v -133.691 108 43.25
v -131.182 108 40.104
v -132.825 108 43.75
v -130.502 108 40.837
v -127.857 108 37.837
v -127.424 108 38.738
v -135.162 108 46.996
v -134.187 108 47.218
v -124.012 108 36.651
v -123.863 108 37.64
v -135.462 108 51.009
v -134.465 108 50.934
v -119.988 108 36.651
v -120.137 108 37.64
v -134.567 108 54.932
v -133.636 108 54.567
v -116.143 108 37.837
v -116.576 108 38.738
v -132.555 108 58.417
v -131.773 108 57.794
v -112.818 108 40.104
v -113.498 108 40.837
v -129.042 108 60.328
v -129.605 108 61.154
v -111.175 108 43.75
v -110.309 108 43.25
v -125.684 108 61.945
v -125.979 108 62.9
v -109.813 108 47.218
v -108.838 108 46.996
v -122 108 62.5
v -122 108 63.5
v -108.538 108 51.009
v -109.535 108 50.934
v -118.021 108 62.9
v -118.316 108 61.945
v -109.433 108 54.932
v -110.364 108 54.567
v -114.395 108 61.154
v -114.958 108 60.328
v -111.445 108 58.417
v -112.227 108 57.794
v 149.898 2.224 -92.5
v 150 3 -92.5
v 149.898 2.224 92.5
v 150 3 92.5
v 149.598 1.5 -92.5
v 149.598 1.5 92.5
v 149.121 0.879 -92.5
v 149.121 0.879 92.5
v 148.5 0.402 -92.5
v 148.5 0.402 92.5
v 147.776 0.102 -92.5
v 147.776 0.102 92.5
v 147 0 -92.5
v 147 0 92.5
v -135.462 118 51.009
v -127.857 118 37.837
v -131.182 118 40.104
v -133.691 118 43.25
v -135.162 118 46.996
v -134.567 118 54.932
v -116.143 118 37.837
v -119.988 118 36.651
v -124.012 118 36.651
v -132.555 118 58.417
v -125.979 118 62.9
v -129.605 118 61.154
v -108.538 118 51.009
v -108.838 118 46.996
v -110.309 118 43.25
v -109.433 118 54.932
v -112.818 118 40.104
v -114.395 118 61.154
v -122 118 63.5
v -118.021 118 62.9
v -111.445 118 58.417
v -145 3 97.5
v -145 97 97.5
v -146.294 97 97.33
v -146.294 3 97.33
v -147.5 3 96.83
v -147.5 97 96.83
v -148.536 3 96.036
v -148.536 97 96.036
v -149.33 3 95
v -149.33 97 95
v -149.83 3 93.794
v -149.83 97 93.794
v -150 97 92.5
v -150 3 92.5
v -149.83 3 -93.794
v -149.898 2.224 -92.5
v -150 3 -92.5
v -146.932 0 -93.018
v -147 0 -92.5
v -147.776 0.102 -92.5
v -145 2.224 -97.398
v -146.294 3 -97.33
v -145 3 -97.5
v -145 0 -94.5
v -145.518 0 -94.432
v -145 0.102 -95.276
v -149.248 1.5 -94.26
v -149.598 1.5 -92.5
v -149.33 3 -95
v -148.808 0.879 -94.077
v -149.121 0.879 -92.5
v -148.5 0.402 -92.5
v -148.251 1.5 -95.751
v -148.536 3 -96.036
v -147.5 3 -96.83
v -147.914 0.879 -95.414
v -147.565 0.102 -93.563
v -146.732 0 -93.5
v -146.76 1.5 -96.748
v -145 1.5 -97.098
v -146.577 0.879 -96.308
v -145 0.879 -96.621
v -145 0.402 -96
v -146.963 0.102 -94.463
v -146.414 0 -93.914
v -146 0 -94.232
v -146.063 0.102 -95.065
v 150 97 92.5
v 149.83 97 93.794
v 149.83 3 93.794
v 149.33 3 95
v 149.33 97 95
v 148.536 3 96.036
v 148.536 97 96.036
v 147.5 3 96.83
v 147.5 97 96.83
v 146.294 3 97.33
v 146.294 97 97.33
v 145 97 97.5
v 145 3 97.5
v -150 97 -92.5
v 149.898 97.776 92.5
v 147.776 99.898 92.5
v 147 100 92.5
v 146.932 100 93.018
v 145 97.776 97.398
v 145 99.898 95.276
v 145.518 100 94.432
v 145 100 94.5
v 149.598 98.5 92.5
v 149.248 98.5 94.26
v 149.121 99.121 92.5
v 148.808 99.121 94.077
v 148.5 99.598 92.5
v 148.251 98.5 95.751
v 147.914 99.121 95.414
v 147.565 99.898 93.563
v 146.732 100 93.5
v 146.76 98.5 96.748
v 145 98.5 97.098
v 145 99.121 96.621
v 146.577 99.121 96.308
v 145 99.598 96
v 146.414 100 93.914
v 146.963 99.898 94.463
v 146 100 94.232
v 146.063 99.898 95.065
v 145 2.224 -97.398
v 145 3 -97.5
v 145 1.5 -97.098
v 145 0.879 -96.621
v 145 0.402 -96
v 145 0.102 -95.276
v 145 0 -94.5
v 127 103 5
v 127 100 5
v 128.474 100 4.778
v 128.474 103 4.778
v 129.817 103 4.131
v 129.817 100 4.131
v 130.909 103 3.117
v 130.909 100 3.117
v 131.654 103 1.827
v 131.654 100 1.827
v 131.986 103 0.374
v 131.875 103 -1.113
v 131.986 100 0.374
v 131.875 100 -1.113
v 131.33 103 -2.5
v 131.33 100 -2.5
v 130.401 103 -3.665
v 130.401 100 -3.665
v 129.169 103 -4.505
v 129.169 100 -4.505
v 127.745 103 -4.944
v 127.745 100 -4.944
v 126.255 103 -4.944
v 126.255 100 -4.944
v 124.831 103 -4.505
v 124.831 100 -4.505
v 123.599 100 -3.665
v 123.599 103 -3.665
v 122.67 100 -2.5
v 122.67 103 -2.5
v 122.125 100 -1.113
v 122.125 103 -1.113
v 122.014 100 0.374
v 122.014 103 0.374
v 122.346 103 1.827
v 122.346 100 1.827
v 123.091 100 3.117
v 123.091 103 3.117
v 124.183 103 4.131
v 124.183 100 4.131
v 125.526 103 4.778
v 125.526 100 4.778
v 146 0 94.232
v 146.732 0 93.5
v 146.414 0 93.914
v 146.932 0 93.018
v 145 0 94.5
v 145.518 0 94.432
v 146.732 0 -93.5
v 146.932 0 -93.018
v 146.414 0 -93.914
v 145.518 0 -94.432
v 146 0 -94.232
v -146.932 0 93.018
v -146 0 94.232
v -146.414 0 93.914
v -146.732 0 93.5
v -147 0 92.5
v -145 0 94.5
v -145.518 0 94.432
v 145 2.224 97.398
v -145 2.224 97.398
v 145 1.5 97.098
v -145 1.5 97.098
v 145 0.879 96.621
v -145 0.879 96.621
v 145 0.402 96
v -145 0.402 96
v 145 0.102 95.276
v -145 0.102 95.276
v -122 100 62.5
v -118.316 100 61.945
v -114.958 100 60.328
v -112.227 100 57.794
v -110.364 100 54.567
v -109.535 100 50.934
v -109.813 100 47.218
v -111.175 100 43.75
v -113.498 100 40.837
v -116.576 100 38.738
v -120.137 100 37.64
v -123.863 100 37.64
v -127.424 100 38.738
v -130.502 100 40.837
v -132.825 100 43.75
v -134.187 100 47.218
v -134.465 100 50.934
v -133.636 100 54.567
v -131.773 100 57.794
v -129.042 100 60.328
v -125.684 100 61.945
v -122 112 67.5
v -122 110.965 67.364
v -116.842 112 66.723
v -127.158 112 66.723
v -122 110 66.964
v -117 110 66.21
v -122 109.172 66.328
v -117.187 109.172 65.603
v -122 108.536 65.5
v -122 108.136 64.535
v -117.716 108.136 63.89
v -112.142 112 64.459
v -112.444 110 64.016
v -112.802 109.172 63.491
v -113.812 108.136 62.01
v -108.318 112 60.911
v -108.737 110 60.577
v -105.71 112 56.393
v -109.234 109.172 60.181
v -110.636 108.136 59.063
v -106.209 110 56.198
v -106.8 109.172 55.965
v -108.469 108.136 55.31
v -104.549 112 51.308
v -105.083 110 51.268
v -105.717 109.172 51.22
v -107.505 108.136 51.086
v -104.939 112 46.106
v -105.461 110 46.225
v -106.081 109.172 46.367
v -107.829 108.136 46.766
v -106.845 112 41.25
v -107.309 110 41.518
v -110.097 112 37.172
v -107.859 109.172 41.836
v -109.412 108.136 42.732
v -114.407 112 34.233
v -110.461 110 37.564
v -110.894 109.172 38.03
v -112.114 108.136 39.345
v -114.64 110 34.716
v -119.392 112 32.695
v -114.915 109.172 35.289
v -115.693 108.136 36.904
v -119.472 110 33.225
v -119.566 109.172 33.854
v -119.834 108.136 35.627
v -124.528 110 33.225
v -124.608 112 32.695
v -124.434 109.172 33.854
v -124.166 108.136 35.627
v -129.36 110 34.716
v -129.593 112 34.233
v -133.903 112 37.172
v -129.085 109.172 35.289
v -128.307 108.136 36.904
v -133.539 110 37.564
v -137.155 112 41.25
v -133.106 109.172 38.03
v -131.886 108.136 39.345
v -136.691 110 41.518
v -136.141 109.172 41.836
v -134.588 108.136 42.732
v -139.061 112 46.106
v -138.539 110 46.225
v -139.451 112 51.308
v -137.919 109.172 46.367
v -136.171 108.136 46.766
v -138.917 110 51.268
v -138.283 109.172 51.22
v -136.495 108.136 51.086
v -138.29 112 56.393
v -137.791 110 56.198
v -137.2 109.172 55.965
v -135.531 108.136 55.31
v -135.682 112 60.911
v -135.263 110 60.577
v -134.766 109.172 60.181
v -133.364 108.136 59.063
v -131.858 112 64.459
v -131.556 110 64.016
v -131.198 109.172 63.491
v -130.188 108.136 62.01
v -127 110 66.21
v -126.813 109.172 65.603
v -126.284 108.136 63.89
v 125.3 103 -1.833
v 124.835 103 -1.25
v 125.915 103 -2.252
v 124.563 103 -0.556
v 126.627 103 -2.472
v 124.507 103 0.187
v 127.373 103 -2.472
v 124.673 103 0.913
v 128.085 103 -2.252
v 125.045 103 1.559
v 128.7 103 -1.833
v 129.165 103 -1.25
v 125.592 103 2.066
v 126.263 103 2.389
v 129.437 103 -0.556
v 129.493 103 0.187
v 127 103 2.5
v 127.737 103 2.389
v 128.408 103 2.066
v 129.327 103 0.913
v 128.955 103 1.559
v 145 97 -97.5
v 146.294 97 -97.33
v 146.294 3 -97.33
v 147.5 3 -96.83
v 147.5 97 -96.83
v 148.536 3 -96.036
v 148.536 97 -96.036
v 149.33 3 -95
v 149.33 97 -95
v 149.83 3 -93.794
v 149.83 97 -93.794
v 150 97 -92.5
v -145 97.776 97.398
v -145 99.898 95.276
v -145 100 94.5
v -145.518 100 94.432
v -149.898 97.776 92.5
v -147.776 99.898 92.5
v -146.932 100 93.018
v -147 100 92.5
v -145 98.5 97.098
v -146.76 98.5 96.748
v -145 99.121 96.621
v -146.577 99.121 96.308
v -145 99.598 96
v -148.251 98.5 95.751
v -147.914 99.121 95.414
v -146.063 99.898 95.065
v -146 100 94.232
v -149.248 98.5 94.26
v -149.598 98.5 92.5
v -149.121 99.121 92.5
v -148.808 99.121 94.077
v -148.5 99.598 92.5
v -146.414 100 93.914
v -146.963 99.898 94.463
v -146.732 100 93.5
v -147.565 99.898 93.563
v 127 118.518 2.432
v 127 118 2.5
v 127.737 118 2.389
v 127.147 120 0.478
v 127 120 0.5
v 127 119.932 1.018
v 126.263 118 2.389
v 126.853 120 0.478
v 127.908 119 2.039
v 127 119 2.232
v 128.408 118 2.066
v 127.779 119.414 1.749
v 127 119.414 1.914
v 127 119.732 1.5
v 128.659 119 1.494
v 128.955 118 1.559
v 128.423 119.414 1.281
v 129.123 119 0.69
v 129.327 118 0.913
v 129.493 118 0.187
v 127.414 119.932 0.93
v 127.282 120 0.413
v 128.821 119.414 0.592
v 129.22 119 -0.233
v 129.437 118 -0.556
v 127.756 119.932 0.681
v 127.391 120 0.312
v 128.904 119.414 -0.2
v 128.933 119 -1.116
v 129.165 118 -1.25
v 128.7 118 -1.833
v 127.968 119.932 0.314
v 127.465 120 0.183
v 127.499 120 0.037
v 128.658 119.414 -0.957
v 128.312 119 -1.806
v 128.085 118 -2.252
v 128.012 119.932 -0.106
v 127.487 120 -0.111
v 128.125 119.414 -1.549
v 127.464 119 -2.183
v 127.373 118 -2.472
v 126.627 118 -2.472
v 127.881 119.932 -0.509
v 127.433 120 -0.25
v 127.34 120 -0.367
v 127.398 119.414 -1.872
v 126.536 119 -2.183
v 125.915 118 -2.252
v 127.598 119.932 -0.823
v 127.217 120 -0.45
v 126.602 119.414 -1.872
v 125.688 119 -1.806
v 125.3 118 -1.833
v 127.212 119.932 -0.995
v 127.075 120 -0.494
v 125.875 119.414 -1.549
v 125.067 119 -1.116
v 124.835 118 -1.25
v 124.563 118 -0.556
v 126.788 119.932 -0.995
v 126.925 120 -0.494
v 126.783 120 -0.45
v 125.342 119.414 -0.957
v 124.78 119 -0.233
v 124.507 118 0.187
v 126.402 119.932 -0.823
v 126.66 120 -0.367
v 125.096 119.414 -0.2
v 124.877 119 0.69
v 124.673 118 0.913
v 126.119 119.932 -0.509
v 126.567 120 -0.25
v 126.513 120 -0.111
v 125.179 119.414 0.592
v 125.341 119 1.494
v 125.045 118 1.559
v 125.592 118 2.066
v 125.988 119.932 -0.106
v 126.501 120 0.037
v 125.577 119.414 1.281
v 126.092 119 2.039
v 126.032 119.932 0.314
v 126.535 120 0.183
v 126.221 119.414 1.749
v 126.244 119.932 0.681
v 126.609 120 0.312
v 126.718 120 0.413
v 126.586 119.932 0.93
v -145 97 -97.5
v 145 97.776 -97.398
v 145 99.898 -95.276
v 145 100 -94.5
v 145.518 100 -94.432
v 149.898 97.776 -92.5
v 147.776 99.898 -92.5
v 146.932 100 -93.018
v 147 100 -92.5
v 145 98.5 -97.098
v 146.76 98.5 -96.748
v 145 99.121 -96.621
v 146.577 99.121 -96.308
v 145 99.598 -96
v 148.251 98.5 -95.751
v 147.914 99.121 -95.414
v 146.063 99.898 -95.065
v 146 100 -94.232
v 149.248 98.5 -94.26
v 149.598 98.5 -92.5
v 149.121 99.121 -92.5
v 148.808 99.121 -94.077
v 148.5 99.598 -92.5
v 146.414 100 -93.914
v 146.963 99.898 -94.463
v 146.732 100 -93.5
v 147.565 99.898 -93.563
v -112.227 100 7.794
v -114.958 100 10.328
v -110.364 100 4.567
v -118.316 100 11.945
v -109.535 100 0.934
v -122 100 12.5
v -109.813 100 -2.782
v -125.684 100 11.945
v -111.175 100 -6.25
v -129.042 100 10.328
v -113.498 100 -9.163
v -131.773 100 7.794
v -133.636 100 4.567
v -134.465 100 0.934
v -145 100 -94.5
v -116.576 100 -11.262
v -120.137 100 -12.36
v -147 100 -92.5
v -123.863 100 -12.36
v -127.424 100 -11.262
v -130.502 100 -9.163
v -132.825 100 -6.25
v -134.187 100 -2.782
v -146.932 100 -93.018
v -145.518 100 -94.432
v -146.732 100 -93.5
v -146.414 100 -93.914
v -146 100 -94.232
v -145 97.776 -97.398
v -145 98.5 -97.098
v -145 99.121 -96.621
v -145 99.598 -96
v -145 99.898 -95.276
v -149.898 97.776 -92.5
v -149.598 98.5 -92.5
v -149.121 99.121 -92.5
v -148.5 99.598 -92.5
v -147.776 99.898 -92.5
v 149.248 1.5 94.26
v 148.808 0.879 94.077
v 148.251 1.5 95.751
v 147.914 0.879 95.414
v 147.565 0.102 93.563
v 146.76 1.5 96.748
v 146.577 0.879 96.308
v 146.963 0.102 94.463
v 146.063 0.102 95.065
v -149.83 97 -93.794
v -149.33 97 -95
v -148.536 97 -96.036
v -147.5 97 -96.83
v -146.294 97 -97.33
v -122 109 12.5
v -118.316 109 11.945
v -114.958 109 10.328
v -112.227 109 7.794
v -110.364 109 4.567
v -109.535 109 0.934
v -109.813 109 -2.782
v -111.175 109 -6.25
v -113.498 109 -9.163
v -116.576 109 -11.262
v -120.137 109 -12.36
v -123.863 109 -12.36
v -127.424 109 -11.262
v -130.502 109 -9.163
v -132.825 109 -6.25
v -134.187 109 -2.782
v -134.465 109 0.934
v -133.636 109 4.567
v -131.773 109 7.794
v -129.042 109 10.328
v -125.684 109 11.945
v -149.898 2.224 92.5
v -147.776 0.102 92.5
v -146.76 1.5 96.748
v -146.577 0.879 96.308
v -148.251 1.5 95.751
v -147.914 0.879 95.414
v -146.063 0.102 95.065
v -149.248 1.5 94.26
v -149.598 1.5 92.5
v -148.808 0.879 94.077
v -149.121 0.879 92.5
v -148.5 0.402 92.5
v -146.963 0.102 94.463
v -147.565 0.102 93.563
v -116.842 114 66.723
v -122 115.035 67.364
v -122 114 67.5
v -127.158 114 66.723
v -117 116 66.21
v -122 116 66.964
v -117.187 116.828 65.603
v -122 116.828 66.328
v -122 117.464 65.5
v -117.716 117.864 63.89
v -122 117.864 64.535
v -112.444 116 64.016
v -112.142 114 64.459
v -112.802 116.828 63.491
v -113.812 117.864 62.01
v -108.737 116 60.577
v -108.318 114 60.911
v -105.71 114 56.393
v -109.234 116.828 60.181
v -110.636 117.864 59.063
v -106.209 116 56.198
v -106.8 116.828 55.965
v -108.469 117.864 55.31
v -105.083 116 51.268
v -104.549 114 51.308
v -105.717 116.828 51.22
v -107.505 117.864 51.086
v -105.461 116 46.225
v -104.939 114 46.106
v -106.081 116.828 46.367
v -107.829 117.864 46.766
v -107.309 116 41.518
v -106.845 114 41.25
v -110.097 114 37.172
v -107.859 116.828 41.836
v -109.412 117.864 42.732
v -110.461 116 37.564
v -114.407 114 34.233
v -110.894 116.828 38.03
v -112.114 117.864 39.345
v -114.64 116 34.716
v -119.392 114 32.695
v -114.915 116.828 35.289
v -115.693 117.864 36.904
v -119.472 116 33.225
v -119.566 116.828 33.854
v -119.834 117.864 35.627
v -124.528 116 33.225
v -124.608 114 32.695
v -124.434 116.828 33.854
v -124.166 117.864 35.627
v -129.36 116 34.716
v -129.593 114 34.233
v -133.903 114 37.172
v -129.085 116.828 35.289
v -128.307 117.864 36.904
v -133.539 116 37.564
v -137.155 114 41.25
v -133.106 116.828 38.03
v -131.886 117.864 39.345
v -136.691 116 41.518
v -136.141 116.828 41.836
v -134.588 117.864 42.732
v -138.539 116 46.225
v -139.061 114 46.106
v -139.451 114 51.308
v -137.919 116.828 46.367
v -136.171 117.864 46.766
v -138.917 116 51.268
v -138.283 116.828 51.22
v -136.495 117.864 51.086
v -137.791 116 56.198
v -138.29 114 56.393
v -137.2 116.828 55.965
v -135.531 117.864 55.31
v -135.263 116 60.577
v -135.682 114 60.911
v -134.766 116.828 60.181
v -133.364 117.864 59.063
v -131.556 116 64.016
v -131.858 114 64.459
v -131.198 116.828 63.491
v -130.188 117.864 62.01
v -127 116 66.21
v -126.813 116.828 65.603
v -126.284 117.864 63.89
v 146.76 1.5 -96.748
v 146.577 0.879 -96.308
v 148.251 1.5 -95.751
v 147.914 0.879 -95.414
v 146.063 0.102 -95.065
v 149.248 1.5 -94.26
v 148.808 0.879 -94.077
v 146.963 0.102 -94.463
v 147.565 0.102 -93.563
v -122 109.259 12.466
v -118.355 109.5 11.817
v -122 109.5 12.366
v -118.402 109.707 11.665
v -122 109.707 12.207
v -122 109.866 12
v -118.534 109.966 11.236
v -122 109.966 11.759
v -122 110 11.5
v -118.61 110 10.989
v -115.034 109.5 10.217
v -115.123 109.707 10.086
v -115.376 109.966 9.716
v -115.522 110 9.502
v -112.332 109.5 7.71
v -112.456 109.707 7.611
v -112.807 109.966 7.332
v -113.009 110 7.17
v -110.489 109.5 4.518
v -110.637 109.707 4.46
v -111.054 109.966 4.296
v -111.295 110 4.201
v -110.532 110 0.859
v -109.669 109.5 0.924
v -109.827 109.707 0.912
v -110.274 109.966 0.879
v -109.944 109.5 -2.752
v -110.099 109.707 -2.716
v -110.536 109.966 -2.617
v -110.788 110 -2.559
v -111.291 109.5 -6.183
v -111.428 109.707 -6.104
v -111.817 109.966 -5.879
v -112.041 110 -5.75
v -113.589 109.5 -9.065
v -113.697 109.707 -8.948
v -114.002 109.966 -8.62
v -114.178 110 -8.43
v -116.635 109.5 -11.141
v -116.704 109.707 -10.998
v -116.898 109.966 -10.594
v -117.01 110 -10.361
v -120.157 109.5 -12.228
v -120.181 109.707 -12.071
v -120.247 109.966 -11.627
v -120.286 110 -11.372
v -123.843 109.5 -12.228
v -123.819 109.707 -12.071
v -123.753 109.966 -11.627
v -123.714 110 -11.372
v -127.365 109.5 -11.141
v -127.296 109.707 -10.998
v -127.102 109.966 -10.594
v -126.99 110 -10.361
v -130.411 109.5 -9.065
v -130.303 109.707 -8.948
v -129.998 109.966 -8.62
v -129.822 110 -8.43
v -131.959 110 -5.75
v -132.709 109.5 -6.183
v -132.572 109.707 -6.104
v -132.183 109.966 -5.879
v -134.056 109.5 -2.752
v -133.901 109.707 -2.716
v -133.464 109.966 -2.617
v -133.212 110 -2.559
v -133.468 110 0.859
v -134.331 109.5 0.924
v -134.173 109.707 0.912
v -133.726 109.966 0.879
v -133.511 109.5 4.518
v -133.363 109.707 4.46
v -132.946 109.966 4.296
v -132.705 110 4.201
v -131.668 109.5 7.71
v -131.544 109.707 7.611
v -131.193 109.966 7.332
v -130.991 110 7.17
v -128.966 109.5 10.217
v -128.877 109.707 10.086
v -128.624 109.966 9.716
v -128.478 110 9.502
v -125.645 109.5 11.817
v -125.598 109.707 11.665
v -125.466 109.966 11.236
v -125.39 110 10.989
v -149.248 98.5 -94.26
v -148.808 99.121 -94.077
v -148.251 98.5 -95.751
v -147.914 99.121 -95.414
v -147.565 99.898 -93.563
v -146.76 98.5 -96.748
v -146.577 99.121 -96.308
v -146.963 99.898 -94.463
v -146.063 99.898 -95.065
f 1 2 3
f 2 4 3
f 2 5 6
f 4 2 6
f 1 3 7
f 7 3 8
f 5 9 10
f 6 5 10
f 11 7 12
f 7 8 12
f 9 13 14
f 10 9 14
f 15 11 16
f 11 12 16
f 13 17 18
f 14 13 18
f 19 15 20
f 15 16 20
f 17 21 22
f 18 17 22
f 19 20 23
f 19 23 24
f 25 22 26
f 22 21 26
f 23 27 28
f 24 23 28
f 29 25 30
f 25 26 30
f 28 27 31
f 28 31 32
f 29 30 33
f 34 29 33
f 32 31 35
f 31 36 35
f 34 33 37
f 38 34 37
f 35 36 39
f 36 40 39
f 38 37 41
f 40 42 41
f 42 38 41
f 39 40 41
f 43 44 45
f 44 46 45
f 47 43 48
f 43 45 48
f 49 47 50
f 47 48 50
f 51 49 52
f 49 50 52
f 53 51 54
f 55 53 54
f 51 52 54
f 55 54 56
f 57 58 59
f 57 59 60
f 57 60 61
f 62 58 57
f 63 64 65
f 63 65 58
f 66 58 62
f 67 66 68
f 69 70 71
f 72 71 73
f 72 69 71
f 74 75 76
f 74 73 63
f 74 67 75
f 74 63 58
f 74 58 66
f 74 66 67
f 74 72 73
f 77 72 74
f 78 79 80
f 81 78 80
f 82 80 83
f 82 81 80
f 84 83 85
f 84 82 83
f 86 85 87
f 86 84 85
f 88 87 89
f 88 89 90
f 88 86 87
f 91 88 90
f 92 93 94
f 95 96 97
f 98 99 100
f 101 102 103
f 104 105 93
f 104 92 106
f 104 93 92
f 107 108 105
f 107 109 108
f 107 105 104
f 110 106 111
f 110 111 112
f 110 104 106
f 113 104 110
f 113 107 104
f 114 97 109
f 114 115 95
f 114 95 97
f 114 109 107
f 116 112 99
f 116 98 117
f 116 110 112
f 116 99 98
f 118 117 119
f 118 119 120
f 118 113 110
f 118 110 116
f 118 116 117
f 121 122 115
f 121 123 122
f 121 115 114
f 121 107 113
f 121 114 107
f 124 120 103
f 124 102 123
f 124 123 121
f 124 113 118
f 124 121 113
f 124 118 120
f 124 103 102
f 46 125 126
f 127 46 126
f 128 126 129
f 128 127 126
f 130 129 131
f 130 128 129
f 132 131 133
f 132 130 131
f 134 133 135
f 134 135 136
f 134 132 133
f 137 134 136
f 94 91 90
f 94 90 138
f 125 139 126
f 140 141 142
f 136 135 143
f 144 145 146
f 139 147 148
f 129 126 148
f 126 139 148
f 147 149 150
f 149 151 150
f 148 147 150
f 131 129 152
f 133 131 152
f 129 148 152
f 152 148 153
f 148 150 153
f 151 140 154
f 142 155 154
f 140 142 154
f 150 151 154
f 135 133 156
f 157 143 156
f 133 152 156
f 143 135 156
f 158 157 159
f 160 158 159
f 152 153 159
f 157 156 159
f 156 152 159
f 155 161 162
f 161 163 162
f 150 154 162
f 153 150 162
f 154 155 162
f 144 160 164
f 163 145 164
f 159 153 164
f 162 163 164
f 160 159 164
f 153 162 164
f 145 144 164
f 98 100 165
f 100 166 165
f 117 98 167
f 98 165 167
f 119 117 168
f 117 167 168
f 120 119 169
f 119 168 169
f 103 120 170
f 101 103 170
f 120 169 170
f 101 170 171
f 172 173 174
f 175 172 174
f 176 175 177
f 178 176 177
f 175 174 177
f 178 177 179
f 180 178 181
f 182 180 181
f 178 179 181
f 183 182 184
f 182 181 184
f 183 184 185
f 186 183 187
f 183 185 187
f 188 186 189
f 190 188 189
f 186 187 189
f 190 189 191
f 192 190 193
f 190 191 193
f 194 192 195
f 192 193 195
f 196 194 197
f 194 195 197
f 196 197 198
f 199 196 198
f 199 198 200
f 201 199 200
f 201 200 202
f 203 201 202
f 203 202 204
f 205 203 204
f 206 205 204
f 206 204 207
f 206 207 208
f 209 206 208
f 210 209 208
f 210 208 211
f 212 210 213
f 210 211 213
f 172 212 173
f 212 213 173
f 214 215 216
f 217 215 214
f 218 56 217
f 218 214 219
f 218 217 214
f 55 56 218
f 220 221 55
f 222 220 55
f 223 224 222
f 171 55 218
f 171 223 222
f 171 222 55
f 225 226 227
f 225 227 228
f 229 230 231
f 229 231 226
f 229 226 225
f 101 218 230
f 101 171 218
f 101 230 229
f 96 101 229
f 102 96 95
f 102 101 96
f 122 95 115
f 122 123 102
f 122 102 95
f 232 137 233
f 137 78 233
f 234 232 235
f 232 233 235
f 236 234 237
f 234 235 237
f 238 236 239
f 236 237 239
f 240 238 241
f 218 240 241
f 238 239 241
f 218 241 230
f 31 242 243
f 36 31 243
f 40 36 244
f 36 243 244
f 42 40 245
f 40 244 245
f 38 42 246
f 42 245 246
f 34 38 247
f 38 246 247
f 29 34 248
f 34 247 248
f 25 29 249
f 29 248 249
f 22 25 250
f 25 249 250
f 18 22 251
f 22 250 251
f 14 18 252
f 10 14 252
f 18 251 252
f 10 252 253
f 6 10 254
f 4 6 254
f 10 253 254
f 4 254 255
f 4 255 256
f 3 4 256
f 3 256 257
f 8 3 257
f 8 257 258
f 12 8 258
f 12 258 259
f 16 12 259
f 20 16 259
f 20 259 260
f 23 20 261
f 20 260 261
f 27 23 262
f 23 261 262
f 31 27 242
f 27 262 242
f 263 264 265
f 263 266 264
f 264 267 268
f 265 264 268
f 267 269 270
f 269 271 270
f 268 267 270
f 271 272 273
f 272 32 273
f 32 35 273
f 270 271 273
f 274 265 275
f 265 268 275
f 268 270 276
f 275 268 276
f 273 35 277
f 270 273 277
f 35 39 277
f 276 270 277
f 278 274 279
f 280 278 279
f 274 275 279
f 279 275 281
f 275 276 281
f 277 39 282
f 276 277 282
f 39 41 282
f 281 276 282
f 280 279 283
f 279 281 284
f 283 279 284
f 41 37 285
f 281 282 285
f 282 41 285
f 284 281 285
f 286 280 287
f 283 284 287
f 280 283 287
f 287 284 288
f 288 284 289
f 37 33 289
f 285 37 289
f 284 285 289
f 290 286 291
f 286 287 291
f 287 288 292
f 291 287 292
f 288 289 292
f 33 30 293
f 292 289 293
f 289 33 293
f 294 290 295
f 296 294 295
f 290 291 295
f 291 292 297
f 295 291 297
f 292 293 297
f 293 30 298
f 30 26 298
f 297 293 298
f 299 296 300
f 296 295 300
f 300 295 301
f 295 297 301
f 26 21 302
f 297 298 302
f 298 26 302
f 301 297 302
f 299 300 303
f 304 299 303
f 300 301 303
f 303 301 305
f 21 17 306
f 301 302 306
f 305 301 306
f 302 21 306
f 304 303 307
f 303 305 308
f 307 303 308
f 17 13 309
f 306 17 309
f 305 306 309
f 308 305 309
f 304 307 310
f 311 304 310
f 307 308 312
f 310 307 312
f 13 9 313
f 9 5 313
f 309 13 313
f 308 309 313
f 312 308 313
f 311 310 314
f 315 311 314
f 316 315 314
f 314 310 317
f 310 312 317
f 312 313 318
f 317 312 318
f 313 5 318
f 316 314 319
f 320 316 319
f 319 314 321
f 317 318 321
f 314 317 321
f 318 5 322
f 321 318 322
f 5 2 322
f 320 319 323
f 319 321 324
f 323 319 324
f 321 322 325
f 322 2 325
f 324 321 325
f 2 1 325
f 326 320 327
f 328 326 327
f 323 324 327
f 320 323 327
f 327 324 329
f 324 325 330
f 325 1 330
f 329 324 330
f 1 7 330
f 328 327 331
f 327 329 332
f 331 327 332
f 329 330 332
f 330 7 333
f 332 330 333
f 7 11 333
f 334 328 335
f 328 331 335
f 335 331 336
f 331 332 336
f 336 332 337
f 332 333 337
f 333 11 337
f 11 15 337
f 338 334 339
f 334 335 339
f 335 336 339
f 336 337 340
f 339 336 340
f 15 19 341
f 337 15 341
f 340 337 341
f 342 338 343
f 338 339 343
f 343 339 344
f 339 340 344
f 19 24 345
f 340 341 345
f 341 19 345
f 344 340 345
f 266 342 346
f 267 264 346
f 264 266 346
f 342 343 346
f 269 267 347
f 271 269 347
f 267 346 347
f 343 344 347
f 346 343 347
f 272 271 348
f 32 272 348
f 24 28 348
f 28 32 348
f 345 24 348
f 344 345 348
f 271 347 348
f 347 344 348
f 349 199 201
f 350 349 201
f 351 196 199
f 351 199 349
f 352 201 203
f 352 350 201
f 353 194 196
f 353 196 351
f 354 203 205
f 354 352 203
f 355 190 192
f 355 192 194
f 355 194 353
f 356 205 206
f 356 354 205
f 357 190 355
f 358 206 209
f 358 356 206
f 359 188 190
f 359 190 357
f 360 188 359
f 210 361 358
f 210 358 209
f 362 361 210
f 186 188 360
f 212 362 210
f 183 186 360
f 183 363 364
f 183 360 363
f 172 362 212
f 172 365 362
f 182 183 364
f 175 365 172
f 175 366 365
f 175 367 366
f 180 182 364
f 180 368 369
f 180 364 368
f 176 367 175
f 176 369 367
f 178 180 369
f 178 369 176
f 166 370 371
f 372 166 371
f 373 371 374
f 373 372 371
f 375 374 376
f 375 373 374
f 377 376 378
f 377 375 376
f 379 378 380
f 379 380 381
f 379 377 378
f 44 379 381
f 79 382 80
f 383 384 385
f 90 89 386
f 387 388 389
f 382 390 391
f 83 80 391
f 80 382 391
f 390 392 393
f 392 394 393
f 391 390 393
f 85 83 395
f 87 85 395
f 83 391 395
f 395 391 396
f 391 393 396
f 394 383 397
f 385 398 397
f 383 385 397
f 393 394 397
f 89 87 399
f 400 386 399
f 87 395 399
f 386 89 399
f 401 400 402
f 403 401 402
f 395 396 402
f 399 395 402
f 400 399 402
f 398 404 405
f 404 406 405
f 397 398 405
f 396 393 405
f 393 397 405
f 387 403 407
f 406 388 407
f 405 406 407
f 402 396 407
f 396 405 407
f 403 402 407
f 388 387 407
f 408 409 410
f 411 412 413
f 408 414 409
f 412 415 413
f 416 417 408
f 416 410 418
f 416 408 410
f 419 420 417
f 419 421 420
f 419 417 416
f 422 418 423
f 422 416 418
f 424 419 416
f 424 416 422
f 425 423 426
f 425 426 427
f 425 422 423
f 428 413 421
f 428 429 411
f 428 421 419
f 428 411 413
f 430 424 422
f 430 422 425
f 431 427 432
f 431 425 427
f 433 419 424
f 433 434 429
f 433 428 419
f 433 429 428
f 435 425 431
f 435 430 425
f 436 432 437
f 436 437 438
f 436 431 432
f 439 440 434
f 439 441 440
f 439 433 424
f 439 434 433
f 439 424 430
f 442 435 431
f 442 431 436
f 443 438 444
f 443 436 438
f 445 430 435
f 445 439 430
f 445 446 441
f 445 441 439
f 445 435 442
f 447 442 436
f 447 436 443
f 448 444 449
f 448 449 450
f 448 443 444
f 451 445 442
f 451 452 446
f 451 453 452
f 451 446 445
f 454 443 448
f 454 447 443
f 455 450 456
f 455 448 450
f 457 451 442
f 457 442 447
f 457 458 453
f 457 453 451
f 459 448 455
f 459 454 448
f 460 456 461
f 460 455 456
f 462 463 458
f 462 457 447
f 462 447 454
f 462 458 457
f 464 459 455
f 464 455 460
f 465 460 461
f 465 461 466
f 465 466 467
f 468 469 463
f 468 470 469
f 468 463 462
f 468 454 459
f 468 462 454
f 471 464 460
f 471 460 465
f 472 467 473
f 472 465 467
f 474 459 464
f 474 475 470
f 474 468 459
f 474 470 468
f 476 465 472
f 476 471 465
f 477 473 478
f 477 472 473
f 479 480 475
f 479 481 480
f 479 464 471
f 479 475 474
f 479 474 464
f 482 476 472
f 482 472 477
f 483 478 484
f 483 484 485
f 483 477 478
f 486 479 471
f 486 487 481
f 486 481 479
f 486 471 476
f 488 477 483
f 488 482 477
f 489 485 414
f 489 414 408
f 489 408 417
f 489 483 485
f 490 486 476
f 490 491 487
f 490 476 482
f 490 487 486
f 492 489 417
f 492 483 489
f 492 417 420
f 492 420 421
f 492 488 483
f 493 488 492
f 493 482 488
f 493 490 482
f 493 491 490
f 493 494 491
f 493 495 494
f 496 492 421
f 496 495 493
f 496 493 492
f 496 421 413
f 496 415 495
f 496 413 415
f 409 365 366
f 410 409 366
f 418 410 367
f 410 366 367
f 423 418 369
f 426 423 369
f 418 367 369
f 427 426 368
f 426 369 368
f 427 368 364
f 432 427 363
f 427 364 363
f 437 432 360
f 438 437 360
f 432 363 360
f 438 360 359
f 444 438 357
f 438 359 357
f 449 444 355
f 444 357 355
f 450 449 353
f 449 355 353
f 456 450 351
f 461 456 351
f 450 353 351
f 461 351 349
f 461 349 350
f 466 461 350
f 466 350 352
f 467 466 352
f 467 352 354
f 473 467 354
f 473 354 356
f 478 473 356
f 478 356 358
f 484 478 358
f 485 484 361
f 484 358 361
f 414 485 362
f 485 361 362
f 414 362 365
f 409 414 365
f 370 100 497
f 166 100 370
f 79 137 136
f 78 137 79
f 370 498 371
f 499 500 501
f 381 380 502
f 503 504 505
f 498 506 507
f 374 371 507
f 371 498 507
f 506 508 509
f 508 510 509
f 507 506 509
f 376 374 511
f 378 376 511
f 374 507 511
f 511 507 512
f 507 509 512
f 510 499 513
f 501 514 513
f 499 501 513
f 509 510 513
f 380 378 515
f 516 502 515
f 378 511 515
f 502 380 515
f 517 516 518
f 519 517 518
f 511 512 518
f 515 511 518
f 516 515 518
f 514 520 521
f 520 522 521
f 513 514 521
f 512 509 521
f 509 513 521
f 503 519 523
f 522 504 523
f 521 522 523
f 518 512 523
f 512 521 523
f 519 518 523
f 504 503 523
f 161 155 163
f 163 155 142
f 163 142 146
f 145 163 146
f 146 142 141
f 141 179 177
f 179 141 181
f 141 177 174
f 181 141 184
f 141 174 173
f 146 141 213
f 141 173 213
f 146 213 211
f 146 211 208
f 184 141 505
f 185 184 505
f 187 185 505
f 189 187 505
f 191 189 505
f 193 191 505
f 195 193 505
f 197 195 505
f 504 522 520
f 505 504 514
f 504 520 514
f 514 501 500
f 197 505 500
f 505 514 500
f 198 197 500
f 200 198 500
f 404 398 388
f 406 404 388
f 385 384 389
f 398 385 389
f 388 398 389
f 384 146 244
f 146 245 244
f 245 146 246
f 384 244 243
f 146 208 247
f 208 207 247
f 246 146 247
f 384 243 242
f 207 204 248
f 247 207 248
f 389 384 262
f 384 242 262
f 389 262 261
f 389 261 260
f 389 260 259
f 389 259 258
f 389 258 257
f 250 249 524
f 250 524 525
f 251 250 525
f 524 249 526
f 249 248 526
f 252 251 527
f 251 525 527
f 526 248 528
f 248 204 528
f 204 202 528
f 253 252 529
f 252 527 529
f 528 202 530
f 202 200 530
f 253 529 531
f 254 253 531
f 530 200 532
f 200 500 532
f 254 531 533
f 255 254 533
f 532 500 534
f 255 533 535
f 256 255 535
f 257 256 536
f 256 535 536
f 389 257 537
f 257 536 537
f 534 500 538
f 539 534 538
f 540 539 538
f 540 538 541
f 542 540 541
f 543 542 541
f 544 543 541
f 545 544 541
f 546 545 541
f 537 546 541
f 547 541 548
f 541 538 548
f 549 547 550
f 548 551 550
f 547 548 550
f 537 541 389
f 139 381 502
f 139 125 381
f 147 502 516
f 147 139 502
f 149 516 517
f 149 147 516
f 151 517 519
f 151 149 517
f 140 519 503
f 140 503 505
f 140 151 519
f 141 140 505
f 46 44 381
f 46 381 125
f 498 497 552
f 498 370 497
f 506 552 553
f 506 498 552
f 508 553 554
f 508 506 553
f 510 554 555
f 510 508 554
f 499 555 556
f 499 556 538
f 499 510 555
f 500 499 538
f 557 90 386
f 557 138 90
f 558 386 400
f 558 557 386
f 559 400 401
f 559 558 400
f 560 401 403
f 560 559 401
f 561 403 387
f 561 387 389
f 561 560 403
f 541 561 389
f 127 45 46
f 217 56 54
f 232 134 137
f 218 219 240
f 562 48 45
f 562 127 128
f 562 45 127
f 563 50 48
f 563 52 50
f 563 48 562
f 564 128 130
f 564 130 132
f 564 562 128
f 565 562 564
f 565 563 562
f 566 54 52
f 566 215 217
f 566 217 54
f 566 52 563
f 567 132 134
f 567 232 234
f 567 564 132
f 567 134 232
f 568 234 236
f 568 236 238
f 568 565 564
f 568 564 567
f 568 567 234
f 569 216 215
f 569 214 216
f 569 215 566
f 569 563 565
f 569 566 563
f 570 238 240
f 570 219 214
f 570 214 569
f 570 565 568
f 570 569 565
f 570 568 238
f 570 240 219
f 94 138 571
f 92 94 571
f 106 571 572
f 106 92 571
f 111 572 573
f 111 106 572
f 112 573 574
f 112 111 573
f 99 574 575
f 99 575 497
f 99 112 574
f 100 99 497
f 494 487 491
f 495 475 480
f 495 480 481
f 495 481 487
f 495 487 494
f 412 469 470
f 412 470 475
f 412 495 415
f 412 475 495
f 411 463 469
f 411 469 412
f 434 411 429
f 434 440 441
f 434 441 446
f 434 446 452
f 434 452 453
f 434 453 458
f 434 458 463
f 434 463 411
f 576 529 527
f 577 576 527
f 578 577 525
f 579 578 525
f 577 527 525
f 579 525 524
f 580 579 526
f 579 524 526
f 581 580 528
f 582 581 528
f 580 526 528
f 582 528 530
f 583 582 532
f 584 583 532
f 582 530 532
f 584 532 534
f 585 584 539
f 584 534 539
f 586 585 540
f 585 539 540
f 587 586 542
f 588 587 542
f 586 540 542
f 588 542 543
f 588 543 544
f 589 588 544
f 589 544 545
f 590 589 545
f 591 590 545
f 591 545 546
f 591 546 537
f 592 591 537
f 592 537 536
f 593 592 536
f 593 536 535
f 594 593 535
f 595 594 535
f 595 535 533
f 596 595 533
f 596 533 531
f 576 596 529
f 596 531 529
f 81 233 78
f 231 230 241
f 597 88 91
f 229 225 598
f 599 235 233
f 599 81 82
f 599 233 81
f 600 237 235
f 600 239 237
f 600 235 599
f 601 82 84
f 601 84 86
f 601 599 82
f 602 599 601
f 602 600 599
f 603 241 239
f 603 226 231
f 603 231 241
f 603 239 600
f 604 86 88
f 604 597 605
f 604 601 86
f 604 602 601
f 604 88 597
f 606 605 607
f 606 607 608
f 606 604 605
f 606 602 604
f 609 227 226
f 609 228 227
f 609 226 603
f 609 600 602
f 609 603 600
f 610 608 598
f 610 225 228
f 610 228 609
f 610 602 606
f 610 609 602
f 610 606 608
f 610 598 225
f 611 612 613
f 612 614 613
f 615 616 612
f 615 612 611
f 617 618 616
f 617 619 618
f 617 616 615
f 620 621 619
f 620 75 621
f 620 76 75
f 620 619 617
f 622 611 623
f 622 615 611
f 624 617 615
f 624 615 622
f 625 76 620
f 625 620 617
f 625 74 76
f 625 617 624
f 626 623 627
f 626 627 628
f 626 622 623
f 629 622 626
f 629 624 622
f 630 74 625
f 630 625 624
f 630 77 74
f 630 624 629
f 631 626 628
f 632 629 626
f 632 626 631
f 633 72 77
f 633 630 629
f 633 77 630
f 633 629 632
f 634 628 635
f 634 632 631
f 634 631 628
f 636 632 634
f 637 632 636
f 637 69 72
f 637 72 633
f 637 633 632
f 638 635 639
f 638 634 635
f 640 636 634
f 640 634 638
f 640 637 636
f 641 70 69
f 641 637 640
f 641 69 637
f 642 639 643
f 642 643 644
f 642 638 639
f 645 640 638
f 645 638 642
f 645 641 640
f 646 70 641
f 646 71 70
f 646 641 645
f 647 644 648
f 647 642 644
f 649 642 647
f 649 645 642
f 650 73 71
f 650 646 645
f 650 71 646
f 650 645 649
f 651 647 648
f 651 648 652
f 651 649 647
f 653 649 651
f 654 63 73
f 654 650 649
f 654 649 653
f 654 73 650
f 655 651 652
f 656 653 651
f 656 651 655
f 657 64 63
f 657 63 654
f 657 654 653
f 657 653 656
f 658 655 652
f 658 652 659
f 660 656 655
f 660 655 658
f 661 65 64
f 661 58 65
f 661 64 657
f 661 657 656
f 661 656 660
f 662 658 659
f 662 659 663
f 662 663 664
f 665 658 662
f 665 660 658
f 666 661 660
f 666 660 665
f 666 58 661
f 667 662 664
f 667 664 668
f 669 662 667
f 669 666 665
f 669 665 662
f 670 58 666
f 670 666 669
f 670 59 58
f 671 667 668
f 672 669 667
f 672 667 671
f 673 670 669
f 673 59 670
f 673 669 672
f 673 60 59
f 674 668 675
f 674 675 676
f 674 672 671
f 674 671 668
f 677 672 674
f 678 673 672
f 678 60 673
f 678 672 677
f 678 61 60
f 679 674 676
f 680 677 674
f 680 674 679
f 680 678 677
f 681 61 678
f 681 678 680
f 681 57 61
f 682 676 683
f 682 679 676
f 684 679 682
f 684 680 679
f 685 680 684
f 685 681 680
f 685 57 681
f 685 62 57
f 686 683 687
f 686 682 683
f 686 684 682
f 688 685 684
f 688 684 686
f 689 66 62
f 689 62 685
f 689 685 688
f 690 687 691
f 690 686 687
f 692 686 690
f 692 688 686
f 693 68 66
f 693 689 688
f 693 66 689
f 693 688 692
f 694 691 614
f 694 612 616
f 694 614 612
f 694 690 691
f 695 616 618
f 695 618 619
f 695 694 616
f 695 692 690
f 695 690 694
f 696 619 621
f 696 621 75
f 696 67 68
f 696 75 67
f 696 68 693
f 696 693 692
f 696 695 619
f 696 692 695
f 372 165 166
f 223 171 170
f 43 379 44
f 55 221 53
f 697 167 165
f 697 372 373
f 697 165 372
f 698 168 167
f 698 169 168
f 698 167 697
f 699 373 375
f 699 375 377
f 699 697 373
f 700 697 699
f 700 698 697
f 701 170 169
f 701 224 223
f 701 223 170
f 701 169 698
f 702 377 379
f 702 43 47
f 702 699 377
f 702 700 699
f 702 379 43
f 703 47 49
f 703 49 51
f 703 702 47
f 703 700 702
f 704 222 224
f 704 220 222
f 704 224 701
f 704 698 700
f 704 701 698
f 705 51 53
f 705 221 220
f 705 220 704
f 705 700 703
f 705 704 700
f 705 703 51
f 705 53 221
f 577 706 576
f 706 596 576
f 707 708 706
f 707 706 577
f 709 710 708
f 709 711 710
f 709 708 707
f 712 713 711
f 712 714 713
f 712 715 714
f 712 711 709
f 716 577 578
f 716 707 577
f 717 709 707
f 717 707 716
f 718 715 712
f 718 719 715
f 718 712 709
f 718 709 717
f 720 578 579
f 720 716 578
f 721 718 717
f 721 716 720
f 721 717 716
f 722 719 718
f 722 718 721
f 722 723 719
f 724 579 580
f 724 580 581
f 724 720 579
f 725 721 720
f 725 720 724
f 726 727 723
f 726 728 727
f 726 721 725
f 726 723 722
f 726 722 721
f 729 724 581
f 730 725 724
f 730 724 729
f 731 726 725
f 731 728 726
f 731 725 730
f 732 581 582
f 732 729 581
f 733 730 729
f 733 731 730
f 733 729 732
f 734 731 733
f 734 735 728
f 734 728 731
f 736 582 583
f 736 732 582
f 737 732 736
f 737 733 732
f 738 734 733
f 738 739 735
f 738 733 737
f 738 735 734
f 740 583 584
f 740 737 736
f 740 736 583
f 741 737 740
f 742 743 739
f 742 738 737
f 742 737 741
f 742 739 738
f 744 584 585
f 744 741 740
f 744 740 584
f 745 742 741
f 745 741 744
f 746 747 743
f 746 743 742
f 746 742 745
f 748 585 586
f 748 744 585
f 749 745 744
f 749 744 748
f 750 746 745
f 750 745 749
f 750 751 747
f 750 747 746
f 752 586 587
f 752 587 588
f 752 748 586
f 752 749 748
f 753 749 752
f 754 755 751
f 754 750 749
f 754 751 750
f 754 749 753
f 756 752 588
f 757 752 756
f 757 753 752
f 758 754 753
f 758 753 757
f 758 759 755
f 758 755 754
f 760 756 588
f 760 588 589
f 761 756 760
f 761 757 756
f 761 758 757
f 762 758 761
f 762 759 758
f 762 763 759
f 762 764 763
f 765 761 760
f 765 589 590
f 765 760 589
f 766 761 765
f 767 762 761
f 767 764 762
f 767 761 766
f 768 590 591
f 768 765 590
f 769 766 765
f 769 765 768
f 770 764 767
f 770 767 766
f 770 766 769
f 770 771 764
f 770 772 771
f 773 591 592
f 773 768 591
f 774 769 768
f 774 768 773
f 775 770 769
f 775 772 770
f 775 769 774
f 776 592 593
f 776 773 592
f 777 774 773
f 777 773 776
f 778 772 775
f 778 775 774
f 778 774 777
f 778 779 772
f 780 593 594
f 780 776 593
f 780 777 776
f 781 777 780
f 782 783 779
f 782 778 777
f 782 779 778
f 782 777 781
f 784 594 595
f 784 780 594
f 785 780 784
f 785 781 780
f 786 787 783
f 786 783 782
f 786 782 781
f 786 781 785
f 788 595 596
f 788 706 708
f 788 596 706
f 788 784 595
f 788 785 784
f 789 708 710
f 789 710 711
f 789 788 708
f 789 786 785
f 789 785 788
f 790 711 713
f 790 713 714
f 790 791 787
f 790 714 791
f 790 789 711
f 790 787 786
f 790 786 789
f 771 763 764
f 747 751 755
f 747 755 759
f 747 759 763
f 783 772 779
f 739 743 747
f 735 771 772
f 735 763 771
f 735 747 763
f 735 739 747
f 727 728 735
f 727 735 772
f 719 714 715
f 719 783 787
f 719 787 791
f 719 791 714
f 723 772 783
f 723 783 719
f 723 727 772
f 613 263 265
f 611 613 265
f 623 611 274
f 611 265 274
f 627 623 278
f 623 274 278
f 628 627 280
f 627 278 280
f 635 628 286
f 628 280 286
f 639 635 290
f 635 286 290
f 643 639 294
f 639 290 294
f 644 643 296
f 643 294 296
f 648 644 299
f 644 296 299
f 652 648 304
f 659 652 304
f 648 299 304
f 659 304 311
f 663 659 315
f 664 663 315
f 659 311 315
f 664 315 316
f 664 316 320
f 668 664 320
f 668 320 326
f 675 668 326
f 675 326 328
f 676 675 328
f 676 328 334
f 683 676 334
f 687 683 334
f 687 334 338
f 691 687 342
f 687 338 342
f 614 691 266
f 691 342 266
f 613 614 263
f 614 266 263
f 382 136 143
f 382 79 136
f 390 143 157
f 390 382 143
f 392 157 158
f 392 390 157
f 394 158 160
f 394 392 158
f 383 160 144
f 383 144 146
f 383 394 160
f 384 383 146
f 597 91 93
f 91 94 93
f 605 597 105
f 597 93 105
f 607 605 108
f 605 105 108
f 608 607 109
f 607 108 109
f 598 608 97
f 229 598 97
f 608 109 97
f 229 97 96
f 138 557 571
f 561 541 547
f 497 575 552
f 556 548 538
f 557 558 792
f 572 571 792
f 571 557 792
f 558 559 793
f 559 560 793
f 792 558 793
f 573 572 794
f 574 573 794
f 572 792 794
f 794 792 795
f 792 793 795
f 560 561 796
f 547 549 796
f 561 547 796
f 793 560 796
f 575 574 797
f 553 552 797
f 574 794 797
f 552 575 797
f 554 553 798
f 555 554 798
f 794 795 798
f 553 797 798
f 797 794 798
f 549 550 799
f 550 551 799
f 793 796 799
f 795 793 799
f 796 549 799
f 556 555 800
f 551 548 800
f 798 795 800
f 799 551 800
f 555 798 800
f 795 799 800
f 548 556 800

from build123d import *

# Parameters (mm, degrees)
BOSS_EXTRUDE1_DEPTH = 100
FILLET3_R           = 3
SKETCH3_R           = 12.5
BOSS_EXTRUDE2_DEPTH = 10
SKETCH4_R           = 12.5
BOSS_EXTRUDE3_DEPTH = 8
SKETCH5_R           = 17.5
BOSS_EXTRUDE5_DEPTH = 10
FILLET6_R           = 4
FILLET7_R           = 1
SKETCH6_R           = 5
BOSS_EXTRUDE6_DEPTH = 3
SKETCH7_R           = 2.5
BOSS_EXTRUDE7_DEPTH = 17
FILLET13_R          = 2


with BuildPart() as part:
    # Sketch2 → Boss-Extrude1 (new body)
    with BuildSketch(Plane(origin=(0, 0, 0), x_dir=(1, 0, 0), z_dir=(0, 1, 0))):
        with BuildLine():
            Line((-145, 97.5), (145, 97.5))
            ThreePointArc((145, 97.5), (148.535533906, 96.035533906), (150, 92.5))
            Line((150, 92.5), (150, -92.5))
            ThreePointArc((150, -92.5), (148.535533906, -96.035533906), (145, -97.5))
            Line((145, -97.5), (-145, -97.5))
            ThreePointArc((-145, -97.5), (-148.535533906, -96.035533906), (-150, -92.5))
            Line((-150, -92.5), (-150, 92.5))
            ThreePointArc((-150, 92.5), (-148.535533906, 96.035533906), (-145, 97.5))
        make_face()
    extrude(amount=BOSS_EXTRUDE1_DEPTH)

    # Fillet3
    fillet3_edges = [part.edges().sort_by_distance(p)[0] for p in [
        (150, 0, 0),
        (148.535533906, 0, 96.035533906),
        (0, 0, 97.5),
        (-148.535533906, 0, 96.035533906),
        (148.535533906, 100, 96.035533906),
        (150, 100, 0),
        (148.535533906, 100, -96.035533906),
        (0, 100, -97.5),
        (-148.535533906, 100, -96.035533906),
        (-150, 100, 0),
        (-148.535533906, 100, 96.035533906),
        (-150, 0, 0),
        (0, 100, 97.5),
        (-148.535533906, 0, -96.035533906),
        (0, 0, -97.5),
        (148.535533906, 0, -96.035533906),
    ]]
    fillet(fillet3_edges, radius=FILLET3_R)

    # Sketch3 → Boss-Extrude2 (add)
    with BuildSketch(Plane(origin=(0, 100, 0), x_dir=(1, 0, 0), z_dir=(0, 1, 0))):
        with Locations(Location((-122, 0, 0), (0, 0, 270))):
            Circle(SKETCH3_R)
    extrude(amount=BOSS_EXTRUDE2_DEPTH)

    # Sketch4 → Boss-Extrude3 (add)
    with BuildSketch(Plane(origin=(0, 100, 0), x_dir=(1, 0, 0), z_dir=(0, 1, 0))):
        with Locations(Location((-122, -50, 0), (0, 0, 270))):
            Circle(SKETCH4_R)
    extrude(amount=BOSS_EXTRUDE3_DEPTH)

    # Sketch5 → Boss-Extrude5 (add)
    with BuildSketch(Plane(origin=(0, 108, 0), x_dir=(1, 0, 0), z_dir=(0, 1, 0))):
        with Locations(Location((-122, -50, 0), (0, 0, 270))):
            Circle(SKETCH5_R)
    extrude(amount=BOSS_EXTRUDE5_DEPTH)

    # Fillet6
    fillet6_edges = [part.edges().sort_by_distance(p)[0] for p in [
        (-122, 108, 32.5),
        (-122, 118, 32.5),
    ]]
    fillet(fillet6_edges, radius=FILLET6_R)

    # Fillet7
    fillet7_edges = [part.edges().sort_by_distance(p)[0] for p in [
        (-122, 110, -12.5),
    ]]
    fillet(fillet7_edges, radius=FILLET7_R)

    # Sketch6 → Boss-Extrude6 (add)
    with BuildSketch(Plane(origin=(0, 100, 0), x_dir=(1, 0, 0), z_dir=(0, 1, 0))):
        with Locations(Location((127, 0, 0), (0, 0, 270))):
            Circle(SKETCH6_R)
    extrude(amount=BOSS_EXTRUDE6_DEPTH)

    # Sketch7 → Boss-Extrude7 (add)
    with BuildSketch(Plane(origin=(0, 103, 0), x_dir=(1, 0, 0), z_dir=(0, 1, 0))):
        with Locations(Location((127, 0, 0), (0, 0, 270))):
            Circle(SKETCH7_R)
    extrude(amount=BOSS_EXTRUDE7_DEPTH)

    # Fillet13
    fillet13_edges = [part.edges().sort_by_distance(p)[0] for p in [
        (127, 120, -2.5),
    ]]
    fillet(fillet13_edges, radius=FILLET13_R)


solid = part.part
